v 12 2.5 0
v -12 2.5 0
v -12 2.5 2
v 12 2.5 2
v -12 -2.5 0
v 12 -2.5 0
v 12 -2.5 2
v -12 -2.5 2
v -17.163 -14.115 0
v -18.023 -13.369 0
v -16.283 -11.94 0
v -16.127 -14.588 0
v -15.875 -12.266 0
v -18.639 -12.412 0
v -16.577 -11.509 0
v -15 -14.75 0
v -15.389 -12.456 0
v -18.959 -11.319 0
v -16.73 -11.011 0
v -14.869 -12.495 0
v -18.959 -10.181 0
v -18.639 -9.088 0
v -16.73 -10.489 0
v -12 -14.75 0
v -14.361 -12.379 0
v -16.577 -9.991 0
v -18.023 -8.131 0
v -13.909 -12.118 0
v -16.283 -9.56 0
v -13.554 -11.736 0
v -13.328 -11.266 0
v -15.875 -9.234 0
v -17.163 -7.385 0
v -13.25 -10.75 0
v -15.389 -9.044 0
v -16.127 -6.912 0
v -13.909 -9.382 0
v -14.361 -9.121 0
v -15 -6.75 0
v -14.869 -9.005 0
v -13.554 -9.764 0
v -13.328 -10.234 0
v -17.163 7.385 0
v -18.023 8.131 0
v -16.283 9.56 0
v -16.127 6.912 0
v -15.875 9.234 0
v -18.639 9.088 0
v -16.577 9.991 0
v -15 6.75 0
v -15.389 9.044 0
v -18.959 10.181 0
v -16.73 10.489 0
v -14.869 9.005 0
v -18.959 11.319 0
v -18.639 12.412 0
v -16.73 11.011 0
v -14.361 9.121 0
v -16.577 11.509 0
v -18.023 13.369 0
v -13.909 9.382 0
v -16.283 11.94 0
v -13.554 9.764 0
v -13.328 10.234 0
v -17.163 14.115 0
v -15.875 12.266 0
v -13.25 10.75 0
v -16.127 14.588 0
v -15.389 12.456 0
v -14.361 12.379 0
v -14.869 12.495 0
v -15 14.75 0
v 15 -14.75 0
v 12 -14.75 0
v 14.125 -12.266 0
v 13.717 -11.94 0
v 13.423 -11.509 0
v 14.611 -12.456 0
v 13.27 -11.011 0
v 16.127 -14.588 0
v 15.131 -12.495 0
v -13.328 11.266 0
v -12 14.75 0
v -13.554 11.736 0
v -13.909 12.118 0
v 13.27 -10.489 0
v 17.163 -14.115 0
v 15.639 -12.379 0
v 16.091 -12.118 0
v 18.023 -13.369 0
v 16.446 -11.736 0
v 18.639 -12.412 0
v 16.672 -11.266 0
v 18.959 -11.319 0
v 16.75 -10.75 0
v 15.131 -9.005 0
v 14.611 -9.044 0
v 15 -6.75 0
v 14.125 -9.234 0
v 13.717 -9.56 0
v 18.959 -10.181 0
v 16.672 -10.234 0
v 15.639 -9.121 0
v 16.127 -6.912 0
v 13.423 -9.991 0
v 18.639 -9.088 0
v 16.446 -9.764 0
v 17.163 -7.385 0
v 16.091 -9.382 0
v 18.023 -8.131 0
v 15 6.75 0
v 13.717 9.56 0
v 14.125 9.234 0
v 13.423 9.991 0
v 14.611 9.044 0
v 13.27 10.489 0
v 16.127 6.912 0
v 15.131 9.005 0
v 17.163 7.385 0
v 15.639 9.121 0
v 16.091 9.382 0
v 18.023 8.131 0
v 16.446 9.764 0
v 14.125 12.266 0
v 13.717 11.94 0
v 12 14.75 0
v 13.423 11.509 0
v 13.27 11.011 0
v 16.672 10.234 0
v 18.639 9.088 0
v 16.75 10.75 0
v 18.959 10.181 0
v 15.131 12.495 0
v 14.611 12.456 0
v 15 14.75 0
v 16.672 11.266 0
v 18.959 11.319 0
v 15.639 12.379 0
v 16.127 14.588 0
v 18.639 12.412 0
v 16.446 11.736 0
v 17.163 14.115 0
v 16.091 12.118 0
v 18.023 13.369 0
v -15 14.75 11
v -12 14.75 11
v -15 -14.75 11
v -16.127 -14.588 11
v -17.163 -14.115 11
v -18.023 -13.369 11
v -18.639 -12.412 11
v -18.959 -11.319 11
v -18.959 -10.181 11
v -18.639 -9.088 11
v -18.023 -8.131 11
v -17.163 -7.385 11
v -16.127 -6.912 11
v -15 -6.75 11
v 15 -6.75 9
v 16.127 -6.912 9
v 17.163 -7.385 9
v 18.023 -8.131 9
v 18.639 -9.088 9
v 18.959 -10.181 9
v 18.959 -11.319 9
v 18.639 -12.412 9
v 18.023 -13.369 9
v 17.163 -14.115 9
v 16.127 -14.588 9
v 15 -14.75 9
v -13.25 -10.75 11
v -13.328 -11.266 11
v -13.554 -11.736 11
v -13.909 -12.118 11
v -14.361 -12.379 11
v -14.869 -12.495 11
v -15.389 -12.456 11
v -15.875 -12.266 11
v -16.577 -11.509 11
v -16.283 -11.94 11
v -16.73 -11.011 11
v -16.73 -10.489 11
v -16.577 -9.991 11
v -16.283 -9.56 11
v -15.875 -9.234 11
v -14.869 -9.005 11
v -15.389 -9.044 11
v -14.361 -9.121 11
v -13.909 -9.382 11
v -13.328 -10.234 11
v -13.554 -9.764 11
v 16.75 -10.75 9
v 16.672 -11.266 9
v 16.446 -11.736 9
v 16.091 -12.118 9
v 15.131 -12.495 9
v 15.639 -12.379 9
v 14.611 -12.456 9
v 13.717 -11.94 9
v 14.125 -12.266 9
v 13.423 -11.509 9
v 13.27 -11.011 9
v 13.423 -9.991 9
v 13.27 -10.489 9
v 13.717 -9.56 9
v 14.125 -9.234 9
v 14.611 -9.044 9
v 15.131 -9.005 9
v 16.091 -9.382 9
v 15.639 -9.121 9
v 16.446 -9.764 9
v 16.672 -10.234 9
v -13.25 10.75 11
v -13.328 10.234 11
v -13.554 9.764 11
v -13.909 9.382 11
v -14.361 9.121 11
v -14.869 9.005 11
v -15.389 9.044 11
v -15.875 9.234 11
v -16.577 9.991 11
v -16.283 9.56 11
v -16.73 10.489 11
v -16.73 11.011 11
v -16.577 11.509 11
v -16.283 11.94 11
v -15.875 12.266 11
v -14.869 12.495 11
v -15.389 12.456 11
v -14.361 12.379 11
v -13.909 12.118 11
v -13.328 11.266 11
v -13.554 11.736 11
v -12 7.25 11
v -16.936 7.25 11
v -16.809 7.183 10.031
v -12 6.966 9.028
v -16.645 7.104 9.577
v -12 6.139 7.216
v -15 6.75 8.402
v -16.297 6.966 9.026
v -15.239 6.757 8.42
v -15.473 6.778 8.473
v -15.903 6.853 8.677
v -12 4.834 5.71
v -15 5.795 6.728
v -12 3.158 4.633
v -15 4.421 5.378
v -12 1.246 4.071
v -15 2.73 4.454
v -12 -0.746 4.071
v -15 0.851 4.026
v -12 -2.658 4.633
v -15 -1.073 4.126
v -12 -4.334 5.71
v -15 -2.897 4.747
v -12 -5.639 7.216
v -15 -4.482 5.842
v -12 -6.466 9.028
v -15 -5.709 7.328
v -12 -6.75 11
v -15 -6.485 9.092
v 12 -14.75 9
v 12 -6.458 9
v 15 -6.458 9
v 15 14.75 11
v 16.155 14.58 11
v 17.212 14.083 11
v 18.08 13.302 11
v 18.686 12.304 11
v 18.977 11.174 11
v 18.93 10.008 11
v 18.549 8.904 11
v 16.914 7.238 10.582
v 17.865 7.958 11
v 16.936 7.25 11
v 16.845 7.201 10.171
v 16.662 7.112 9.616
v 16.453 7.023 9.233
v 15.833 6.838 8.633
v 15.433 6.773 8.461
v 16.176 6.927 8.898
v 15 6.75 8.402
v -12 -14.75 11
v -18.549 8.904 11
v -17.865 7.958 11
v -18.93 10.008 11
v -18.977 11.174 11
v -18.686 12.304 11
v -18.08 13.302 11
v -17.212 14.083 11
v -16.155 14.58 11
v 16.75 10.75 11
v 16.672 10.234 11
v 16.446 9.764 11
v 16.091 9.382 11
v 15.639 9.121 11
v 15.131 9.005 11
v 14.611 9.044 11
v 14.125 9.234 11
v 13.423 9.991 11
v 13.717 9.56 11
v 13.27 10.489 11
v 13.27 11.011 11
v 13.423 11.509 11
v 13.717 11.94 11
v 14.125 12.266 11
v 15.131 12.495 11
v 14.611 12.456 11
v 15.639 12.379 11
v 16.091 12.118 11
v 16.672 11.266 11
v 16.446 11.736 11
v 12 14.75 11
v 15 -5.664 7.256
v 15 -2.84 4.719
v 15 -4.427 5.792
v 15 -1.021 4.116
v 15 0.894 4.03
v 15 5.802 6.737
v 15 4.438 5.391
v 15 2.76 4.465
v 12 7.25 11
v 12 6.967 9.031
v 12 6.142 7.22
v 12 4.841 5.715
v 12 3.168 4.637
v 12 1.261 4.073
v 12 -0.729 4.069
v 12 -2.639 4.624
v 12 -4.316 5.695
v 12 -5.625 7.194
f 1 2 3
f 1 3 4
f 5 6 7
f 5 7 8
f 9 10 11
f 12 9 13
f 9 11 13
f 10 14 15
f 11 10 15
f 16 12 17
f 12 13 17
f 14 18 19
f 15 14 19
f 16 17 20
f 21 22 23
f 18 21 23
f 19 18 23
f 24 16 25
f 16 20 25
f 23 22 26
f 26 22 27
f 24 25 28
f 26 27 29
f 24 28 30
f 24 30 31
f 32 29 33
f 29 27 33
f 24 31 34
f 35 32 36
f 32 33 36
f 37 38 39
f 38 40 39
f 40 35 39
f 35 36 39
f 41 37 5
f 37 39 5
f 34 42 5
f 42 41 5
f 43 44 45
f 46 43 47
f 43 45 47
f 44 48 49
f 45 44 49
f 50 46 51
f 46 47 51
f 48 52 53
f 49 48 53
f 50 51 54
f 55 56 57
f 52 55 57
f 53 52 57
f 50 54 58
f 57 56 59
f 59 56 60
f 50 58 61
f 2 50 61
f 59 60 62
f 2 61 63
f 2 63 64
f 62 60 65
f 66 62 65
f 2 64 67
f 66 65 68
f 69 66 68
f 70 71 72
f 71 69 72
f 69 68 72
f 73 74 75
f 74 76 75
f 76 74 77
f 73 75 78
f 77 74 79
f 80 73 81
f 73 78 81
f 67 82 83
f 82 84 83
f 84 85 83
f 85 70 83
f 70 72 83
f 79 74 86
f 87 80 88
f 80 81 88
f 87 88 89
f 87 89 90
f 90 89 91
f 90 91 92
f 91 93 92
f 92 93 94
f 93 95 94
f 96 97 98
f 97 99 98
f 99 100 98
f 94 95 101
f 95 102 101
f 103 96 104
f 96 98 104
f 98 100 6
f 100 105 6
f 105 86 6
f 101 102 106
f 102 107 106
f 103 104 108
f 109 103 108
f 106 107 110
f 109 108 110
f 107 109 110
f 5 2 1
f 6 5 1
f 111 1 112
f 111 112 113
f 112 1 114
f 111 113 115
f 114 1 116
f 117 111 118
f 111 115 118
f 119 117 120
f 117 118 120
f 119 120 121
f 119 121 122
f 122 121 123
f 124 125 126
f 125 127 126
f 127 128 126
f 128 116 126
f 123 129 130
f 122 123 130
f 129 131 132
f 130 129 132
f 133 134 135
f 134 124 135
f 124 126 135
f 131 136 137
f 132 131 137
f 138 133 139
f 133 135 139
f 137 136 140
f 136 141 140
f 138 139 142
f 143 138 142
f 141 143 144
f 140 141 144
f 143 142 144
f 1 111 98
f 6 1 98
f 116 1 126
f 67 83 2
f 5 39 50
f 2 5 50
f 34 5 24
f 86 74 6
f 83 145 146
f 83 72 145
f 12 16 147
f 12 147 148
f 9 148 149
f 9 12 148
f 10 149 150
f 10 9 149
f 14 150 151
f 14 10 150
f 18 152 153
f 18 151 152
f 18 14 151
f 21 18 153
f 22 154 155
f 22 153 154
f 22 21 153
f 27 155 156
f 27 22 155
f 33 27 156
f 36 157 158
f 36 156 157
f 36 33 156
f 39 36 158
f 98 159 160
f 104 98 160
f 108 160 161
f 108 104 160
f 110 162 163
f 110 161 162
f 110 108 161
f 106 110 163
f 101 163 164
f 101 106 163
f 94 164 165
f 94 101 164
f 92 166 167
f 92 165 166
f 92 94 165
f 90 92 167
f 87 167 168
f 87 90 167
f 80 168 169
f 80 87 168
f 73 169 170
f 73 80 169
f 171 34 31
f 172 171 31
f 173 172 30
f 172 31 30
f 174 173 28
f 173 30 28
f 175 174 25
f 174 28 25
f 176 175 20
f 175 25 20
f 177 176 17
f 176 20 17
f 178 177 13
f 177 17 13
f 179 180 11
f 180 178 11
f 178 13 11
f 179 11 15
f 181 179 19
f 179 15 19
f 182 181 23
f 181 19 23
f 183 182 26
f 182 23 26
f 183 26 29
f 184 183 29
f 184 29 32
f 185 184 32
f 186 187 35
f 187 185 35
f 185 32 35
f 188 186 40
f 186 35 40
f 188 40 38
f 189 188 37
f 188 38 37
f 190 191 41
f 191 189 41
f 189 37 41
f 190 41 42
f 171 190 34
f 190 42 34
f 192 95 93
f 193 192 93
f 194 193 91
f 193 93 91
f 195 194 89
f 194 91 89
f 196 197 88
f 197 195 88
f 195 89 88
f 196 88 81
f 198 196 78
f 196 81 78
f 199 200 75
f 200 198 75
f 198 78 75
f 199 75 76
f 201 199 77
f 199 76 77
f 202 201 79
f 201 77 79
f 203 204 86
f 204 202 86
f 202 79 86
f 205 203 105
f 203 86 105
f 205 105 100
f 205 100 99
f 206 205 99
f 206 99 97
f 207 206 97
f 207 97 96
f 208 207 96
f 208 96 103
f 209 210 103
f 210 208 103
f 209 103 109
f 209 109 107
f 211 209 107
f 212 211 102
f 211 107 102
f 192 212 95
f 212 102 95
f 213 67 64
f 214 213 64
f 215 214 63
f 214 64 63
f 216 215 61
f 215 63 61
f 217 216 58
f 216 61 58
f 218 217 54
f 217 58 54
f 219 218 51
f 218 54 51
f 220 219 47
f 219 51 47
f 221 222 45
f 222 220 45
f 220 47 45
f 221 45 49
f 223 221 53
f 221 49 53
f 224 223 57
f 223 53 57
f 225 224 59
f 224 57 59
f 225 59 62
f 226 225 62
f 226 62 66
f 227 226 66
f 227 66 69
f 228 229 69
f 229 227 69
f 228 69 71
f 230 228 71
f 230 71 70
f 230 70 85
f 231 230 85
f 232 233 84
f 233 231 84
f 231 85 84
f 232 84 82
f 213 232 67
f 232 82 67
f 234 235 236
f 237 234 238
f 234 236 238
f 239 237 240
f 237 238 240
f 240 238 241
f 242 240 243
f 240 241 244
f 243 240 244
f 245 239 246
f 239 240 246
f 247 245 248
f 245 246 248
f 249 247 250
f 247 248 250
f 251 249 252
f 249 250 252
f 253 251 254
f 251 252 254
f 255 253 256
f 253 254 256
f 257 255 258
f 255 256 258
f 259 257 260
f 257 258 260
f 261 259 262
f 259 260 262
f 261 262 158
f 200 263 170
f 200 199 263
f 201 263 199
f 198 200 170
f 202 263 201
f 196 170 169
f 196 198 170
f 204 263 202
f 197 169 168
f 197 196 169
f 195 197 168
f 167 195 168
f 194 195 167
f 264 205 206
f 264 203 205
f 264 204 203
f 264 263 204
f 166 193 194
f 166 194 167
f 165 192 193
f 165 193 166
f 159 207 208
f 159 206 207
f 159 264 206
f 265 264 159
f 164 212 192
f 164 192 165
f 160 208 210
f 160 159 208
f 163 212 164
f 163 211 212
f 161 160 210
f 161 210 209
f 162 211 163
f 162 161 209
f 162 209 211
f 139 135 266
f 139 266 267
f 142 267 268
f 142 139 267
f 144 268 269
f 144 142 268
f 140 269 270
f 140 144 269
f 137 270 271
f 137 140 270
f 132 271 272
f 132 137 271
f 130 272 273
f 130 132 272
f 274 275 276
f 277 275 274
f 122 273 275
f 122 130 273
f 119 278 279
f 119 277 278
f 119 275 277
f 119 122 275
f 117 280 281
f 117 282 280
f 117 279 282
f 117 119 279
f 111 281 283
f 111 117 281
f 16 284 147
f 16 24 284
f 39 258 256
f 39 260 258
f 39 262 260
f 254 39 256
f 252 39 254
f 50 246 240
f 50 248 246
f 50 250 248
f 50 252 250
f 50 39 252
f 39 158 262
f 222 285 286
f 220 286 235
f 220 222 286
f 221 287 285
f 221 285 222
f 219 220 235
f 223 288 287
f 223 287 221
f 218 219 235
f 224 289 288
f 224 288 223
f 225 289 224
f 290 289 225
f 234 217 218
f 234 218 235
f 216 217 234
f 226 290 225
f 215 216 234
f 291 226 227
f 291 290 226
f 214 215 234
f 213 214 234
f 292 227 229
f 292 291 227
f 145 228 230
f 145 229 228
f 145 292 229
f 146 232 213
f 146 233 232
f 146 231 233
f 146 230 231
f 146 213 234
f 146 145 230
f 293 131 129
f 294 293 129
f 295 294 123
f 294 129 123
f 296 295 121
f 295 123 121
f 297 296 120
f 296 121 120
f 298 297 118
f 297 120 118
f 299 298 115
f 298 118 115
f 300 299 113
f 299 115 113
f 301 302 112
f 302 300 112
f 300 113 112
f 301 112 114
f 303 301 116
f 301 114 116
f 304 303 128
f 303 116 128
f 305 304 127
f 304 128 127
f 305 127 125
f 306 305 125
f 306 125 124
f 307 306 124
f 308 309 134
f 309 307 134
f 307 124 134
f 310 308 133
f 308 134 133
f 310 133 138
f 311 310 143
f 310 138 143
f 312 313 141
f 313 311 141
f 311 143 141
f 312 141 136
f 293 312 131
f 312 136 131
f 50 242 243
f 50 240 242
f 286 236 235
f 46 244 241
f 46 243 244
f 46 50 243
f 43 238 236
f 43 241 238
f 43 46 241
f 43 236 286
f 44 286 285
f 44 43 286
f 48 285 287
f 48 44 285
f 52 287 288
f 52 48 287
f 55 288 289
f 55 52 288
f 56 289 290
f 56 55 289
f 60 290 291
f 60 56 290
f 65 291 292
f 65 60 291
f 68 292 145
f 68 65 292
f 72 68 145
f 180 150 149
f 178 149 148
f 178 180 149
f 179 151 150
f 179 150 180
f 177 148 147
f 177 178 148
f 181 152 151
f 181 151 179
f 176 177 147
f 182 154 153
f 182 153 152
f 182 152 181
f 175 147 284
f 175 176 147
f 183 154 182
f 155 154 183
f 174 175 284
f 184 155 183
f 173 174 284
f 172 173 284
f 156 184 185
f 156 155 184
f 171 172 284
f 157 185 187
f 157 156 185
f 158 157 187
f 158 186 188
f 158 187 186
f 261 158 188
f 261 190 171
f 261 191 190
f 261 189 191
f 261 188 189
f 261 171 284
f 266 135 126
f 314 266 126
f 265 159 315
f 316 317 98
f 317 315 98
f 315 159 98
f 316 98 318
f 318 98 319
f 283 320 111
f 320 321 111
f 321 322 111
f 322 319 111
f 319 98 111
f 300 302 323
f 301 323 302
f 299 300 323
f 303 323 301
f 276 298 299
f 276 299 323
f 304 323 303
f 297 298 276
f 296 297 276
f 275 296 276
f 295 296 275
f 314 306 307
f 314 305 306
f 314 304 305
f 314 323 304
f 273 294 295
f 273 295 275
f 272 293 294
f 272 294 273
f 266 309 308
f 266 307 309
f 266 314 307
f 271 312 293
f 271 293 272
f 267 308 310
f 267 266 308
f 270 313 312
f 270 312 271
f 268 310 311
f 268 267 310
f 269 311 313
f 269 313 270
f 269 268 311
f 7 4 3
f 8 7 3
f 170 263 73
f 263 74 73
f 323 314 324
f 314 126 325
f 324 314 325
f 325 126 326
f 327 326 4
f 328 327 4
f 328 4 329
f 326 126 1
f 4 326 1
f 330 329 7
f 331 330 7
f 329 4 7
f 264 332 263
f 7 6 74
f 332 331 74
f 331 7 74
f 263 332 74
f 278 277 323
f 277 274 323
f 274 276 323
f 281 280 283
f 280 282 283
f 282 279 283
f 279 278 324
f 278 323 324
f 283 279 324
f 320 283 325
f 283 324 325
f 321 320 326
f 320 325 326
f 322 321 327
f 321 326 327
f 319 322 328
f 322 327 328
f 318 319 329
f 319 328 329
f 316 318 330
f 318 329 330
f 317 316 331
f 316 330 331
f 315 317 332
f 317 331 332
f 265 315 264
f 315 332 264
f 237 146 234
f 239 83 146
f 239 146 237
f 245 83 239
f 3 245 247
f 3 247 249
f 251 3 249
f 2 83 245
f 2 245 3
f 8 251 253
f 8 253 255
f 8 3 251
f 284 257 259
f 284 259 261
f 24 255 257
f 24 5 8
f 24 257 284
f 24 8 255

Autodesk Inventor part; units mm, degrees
ref_plane "YZ Plane" through (0, 0, 0) normal (1, 0, 0) x (0, 1, 0)
ref_plane "XZ Plane" through (0, 0, 0) normal (0, 1, 0) x (-1, 0, 0)
ref_plane "XY Plane" through (0, 0, 0) normal (0, 0, 1) x (1, 0, 0)
sketch "Эскиз1" plane through (0, 0, 0) normal (0, 0, 1) x (1, 0, 0)
  circle A0 centre (15, 10.75) radius 1.75 projected
  circle A1 centre (-15, 10.75) radius 1.75 projected
  circle A2 centre (-15, -10.75) radius 1.75 projected
  circle A3 centre (15, -10.75) radius 1.75 projected
  arc A4 (15, 6.75) -> (15, 14.75) centre (15, 10.75) ccw projected
  arc A5 (15, -14.75) -> (15, -6.75) centre (15, -10.75) ccw projected
  arc A6 (-15, 14.75) -> (-15, 6.75) centre (-15, 10.75) ccw projected
  arc A7 (-15, -6.75) -> (-15, -14.75) centre (-15, -10.75) ccw projected
  line L0 (15, 14.75) -> (12, 14.75)
  line L1 (12, 14.75) -> (12, -14.75)
  line L2 (12, -14.75) -> (15, -14.75)
  line L3 (15, -6.75) -> (15, 6.75)
  line L4 (-15, 14.75) -> (-12, 14.75)
  line L5 (-12, 14.75) -> (-12, -14.75)
  line L6 (-12, -14.75) -> (-15, -14.75)
  line L7 (-15, -6.75) -> (-15, 6.75)
  point P0 (0, 0)
  dimension "d0" = 3
extrude "Выдавливание1" add sketch "Эскиз1" along normal blind 11
sketch "Эскиз2" plane through (-12, -14.75, 0) normal (1, 0, 0) x (0, 0, -1)
  line L0 (-11, 0) -> (-11, 29.5) projected
  line L1 (-11, 29.5) -> (-5, 29.5)
  line L2 (-5, 0) -> (-11, 0)
  line L3 (-11, 0) -> (-11, 29.5)
  line L4 (0, 0) -> (-11, 0) projected
  arc A0 (-11, 8) -> (-11, 22) centre (-11, 15) ccw
  point P0 (0, 14.75)
  dimension "d4" = 6
  dimension "d5" = 7
  dimension "d13" = 14.5
extrude "Выдавливание2" cut sketch "Эскиз2" along normal blind 30 and the other way blind 6
sketch "Эскиз3" plane through (0, 0, 0) normal (0, 0, -1) x (-1, 0, 0)
  line L0 (12, 14.75) -> (12, -14.75) projected
  line L1 (-12, -2.5) -> (12, -2.5)
  line L2 (12, -2.5) -> (12, 2.5)
  line L3 (12, 2.5) -> (-12, 2.5)
  line L4 (-12, 2.5) -> (-12, -2.5)
  line L5 (-12, -2.5) -> (12, 2.5) construction
  line L6 (12, -2.5) -> (-12, 2.5) construction
  point P0 (0, 0)
  dimension "d10" = 5
extrude "Выдавливание3" add sketch "Эскиз3" against normal blind 2
sketch "Эскиз5" plane through (0, 0, 11) normal (0, 0, 1) x (1, 0, 0)
  circle A0 centre (15, -10.75) radius 1.75 projected
  line L0 (15, -6.75) -> (12, -6.75) projected
  line L1 (12, -6.75) -> (12, -14.75) projected
  line L2 (12, -14.75) -> (15, -14.75) projected
  arc A1 (15, -14.75) -> (15, -6.75) centre (15, -10.75) ccw projected
  line L3 (12, -6.75) -> (15, -6.75)
  line L4 (15, -6.75) -> (15, -2.5)
  line L5 (15, -2.5) -> (12, -2.5)
  line L6 (12, -2.5) -> (12, -6.75)
  point P0 (0, 0)
extrude "Выдавливание4" cut sketch "Эскиз5" against normal blind 2
sketch "Эскиз6" plane through (0, 0, 9) normal (0, 0, 1) x (1, 0, 0)
  line L0 (-25, 4) -> (25, 4)
  line L1 (25, 4) -> (25, -4)
  line L2 (25, -4) -> (-25, -4)
  line L3 (-25, -4) -> (-25, 4)
  line L4 (-25, 4) -> (25, -4) construction
  line L5 (25, 4) -> (-25, -4) construction
  circle A0 centre (15, -10.75) radius 1.75 projected
  circle A1 centre (15, -10.75) radius 6
  point P0 (0, 0)
  dimension "d19" = 50
  dimension "d20" = 8
  dimension "d21" = 12
properties part number "Fastening"
